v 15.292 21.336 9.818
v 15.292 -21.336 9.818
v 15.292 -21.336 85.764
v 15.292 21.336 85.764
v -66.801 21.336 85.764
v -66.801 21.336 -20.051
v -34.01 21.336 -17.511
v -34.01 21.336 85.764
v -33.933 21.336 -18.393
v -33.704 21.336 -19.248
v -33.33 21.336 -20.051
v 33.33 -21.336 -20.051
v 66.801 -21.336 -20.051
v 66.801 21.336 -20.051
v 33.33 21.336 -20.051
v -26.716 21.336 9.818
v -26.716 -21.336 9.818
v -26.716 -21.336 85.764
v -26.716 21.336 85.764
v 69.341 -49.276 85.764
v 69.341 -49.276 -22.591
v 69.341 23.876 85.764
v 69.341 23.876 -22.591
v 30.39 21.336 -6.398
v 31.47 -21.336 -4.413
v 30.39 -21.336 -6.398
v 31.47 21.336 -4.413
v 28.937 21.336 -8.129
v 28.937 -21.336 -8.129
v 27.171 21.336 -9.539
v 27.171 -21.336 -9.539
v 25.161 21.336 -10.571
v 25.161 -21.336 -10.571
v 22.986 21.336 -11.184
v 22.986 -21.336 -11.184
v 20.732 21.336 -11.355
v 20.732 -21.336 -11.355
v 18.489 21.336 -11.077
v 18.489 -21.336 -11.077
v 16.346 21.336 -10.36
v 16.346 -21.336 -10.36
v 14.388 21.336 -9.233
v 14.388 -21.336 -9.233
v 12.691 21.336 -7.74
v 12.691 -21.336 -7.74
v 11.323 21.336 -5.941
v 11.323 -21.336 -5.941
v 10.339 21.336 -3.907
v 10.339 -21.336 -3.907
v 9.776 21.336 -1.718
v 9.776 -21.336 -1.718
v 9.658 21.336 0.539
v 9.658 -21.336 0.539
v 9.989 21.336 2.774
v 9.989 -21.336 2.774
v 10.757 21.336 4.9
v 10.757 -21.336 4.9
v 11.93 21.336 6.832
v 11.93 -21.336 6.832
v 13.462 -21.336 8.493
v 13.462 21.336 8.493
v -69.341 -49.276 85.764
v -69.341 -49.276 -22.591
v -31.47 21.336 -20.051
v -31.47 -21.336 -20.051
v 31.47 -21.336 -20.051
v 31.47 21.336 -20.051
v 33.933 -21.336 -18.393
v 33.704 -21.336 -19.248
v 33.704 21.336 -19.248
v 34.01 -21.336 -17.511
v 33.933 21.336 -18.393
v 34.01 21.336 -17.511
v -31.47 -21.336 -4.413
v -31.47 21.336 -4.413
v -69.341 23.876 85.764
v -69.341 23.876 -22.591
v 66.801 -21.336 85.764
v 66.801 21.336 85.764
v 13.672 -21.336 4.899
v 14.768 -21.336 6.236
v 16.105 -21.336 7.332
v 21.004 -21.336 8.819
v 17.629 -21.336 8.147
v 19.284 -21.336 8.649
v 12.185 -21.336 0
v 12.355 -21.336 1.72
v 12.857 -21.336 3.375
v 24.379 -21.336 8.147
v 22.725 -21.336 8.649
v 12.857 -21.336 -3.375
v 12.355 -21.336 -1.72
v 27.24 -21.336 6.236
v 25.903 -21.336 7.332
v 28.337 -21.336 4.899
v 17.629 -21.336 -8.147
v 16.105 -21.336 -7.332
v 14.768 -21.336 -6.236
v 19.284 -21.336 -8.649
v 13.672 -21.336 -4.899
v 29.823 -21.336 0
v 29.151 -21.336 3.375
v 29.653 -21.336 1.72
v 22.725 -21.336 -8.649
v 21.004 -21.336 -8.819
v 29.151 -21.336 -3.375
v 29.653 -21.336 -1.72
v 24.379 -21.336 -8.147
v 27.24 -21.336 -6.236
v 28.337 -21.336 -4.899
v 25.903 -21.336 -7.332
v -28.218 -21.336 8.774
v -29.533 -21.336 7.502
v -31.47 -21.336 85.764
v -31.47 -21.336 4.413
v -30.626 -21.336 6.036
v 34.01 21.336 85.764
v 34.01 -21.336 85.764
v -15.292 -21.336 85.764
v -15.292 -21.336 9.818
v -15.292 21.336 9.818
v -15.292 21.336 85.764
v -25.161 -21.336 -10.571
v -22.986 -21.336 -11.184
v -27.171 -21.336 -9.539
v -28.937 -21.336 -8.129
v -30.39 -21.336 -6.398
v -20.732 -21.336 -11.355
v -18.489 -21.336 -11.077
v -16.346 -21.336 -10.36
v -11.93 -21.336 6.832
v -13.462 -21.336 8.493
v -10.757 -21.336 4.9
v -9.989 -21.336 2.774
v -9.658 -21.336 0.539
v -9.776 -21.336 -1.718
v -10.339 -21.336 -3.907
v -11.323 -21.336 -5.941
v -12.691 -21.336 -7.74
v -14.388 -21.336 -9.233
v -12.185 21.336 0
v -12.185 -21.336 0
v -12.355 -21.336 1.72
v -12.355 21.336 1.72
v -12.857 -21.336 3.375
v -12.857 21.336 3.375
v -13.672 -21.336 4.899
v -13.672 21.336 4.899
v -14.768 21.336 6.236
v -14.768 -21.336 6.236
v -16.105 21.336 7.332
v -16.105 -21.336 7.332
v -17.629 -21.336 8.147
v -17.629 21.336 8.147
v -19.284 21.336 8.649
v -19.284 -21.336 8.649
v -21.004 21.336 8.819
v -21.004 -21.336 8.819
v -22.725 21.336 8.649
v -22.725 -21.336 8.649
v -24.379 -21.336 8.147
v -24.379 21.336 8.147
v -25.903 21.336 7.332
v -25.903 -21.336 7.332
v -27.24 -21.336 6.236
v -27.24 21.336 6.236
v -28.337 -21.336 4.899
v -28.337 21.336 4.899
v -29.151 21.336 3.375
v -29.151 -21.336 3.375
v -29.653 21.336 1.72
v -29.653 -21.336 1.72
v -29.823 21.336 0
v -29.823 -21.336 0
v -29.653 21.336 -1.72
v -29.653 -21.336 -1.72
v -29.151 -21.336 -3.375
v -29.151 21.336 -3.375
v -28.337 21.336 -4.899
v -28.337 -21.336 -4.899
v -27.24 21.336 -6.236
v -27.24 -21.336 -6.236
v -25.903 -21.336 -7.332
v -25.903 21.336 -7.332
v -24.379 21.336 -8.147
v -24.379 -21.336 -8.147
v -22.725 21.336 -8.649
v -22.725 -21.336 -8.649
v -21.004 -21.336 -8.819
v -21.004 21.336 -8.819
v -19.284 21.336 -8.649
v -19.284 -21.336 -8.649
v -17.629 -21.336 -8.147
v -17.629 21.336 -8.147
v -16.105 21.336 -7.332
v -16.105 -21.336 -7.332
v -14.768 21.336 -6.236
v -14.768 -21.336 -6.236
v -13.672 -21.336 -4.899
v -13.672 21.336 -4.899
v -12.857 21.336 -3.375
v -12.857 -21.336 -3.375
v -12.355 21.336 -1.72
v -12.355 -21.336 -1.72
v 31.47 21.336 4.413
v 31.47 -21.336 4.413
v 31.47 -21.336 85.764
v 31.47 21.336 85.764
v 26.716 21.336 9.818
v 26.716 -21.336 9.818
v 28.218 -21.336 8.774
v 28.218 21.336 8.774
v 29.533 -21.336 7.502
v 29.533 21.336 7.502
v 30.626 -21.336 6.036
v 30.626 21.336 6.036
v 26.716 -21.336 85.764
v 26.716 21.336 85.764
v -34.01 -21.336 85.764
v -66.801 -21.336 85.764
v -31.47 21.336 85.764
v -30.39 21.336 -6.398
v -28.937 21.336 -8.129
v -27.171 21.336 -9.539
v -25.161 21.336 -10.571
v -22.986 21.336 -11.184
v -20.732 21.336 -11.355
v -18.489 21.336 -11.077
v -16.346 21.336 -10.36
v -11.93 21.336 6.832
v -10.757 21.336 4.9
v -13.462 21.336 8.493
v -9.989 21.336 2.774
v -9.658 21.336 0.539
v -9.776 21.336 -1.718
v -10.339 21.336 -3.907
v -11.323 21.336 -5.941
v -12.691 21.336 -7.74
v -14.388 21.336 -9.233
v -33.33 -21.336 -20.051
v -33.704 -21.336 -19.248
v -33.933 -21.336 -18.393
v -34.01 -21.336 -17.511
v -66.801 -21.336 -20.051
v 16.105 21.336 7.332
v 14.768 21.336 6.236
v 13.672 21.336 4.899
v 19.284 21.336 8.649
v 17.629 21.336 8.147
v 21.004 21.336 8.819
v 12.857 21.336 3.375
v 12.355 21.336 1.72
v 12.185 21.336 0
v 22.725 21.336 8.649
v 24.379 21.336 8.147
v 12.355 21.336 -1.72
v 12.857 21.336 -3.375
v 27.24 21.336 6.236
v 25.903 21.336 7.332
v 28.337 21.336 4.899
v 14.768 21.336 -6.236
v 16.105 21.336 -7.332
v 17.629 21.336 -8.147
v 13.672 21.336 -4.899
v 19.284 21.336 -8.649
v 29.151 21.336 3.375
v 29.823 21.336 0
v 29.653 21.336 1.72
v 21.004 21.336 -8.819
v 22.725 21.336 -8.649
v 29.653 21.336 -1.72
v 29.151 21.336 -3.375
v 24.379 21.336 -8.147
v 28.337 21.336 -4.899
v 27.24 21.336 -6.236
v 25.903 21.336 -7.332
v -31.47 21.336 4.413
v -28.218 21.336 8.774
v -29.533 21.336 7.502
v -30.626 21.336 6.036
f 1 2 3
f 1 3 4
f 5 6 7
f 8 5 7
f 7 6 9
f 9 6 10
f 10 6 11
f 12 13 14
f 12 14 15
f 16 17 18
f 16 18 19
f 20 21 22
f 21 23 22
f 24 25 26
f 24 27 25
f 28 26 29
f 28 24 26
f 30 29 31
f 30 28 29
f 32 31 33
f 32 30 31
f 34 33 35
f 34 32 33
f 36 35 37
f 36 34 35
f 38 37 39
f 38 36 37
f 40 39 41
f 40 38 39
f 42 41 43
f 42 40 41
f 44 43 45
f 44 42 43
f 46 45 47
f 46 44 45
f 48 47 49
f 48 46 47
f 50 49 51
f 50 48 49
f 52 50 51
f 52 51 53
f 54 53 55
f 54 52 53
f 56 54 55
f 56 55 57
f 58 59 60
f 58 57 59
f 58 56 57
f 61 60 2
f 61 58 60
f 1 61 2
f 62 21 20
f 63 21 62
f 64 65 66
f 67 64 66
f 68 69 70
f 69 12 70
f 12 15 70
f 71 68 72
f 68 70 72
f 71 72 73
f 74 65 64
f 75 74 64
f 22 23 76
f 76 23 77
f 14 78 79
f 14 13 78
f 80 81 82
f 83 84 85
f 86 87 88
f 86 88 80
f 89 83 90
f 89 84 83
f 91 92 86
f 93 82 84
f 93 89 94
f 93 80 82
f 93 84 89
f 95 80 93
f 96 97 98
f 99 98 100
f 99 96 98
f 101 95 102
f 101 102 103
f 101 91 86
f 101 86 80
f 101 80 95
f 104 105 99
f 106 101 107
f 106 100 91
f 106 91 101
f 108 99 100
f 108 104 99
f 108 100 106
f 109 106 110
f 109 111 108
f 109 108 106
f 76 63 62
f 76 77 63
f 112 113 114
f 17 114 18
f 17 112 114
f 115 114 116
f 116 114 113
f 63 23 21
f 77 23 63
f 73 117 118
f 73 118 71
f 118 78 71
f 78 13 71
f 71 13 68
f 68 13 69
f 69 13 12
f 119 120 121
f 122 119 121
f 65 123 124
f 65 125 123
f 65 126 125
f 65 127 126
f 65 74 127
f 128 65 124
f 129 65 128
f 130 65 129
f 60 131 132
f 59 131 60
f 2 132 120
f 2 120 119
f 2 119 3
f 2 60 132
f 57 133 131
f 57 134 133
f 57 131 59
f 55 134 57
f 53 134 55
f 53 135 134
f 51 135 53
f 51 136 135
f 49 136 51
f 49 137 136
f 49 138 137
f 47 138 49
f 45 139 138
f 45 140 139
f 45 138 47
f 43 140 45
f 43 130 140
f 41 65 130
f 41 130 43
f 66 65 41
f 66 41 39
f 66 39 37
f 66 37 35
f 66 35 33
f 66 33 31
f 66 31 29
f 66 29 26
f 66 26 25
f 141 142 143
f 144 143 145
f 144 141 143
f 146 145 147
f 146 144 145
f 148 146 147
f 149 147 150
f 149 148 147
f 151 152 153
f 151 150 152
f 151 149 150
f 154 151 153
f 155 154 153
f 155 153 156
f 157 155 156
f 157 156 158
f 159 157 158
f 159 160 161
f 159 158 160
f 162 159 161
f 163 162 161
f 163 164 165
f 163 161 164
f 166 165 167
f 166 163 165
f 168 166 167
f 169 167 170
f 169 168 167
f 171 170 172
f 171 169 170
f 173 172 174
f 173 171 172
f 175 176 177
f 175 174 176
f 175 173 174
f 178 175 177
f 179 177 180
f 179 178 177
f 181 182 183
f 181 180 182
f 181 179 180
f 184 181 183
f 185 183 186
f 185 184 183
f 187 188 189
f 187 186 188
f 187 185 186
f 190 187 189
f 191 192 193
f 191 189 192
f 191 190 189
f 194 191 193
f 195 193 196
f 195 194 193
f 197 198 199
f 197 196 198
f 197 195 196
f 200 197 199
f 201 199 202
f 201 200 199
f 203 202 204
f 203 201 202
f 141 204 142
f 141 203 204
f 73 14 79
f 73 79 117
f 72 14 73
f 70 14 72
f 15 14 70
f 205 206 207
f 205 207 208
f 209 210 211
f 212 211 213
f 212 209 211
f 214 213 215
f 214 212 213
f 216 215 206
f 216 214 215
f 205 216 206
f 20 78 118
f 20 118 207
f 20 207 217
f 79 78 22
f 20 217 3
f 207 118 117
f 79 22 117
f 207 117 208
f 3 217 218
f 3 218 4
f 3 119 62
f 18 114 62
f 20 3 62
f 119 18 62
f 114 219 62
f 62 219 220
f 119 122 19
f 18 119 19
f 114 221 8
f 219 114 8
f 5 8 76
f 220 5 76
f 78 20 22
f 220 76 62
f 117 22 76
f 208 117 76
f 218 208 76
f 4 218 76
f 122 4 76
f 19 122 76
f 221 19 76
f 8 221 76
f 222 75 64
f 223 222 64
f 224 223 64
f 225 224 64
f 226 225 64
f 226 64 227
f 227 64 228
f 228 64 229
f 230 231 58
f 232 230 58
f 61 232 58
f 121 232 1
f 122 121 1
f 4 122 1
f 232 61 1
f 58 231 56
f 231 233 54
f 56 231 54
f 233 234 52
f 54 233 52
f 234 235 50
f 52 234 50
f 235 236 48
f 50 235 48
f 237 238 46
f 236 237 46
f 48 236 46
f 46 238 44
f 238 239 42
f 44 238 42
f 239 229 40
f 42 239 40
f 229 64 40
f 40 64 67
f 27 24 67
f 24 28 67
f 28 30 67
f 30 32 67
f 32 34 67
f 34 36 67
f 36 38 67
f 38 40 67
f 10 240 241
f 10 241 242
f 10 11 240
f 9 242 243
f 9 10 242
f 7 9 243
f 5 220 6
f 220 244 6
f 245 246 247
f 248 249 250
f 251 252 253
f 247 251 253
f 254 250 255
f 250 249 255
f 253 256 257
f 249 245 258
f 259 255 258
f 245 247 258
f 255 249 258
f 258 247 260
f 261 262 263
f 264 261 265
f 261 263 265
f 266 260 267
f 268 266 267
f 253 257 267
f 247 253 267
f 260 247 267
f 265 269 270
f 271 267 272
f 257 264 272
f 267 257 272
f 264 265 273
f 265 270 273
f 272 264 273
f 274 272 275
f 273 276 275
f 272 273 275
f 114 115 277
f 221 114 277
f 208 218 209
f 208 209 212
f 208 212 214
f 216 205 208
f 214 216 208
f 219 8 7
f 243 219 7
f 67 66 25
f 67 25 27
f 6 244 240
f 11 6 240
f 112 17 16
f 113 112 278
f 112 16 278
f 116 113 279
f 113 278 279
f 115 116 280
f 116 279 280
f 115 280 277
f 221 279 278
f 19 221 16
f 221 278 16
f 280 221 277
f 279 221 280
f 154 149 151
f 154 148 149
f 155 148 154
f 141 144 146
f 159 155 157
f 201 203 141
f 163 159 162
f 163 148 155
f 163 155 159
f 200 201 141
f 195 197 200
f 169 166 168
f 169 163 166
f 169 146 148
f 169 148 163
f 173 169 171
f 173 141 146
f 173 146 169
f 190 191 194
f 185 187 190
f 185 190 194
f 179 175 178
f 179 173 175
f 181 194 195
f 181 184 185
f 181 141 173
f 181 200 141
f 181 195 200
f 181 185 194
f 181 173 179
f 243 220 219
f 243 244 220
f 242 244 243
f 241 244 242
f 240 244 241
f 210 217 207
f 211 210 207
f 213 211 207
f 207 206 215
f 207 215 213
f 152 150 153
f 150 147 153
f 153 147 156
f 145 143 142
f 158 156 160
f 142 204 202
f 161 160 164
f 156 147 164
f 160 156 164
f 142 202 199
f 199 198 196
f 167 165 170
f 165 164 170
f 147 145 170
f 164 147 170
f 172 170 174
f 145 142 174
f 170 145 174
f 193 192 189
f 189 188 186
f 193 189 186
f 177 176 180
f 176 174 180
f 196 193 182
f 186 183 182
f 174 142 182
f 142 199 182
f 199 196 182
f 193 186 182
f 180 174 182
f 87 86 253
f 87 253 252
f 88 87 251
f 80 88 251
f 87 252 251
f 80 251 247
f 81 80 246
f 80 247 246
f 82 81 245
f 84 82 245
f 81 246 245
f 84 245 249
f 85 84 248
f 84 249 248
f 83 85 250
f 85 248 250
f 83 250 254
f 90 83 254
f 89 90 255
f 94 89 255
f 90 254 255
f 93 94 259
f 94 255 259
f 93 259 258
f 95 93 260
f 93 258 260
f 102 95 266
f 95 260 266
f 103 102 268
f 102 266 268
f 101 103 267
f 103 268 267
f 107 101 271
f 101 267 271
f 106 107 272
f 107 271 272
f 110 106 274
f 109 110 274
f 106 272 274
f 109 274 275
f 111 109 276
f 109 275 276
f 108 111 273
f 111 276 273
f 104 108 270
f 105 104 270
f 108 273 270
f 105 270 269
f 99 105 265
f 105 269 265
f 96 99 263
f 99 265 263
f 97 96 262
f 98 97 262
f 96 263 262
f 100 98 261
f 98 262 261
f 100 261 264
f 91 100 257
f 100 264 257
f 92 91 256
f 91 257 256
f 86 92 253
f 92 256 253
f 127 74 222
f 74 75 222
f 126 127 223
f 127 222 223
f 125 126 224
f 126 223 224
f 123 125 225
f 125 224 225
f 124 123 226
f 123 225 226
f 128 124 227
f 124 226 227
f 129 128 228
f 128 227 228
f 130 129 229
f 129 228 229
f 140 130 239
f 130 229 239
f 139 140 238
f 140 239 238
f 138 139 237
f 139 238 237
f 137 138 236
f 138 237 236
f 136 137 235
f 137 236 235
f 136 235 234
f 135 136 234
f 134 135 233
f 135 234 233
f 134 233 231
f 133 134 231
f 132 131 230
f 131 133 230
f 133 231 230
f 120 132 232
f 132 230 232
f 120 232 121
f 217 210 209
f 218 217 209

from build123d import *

# Parameters (mm, degrees)
F0_W     = 103.351444006
F0_H     = 32.4089471251
F0_R     = 8.8186134511
F2_DEPTH = 23.876
F3_T     = 2.54
F4_R     = 5.08
F5_DEPTH = 75.946
F6_DEPTH = 25.4


# Not quite as in the source:
# - a shell that OpenCascade refuses in one call is made with other operations: the cavity is built on its own and cut out
# - the program builds the solid bodies; features that only make, move or delete a surface that nothing else refers to are left out


with BuildPart() as f2:
    # F0 (on Front) → F2 (new body, symmetric)
    with BuildSketch(Plane.XZ):
        with Locations((-17.6653191447, -6.3865175471)):
            Rectangle(F0_W, F0_H)
        with Locations((-21.0040956736, 0)):
            Circle(F0_R, mode=Mode.SUBTRACT)
    extrude(amount=F2_DEPTH, both=True)

    # F3: shell of thickness 2.54, made by hand


with BuildPart() as f3_core1:
    # F3_t2: copy of F2
    add(f2.part)

    # the walls: a layer under each face that stays
    f3_faces = [f3_core1.faces().sort_by_distance(p)[0] for p in [
        (34.0104028583, 0, -6.3865175471),
        (-17.6653191447, 0, -22.5909911096),
        (-69.3410411477, 0, -6.3865175471),
        (-52.11580048, -23.876, -17.1894999221),
        (-29.8227091247, 0, 0),
        (-52.11580048, 23.876, -17.1894999221),
    ]]
    thicken(f3_faces, amount=-F3_T, mode=Mode.SUBTRACT)


with BuildPart() as f2_1:
    add(f2.part)

    # what is left inside the walls is the cavity
    f3_cavity = [f3_core1.part.solids().sort_by_distance(p)[0] for p in [
        (-17.665319, 7.112, -20.025591),
    ]]
    add(f3_cavity, mode=Mode.SUBTRACT)

    # F4
    f4_edges = [f2_1.edges().sort_by_distance(p)[0] for p in [
        (34.010403, 0, -22.590991),
    ]]
    fillet(f4_edges, radius=F4_R)

    # F5 (add): a face of the model
    f5_faces = [f2_1.faces().sort_by_distance(p)[0] for p in [
        (-18.9893309888, 0, 9.8179560155),
    ]]
    extrude(f5_faces, amount=F5_DEPTH)

    # F6 (add): a face of the model
    f6_faces = [f2_1.faces().sort_by_distance(p)[0] for p in [
        (-17.6163810634, -23.876, 32.3181446874),
    ]]
    extrude(f6_faces, amount=F6_DEPTH)

    # F7: F2 across plane


with BuildPart() as f2_2:
    add(f2_1.part)
    add(f2_1.part.mirror(Plane.YZ))


solid = f2_2.part
